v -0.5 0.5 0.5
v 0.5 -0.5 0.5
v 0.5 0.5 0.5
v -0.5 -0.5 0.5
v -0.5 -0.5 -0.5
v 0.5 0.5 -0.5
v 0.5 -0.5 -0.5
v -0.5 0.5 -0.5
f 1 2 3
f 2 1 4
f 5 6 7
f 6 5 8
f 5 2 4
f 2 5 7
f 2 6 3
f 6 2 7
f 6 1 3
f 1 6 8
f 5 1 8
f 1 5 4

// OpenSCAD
module unit_cube() {
    cube([1, 1, 1], center=true);
}

// Place the cube at the origin
unit_cube();
